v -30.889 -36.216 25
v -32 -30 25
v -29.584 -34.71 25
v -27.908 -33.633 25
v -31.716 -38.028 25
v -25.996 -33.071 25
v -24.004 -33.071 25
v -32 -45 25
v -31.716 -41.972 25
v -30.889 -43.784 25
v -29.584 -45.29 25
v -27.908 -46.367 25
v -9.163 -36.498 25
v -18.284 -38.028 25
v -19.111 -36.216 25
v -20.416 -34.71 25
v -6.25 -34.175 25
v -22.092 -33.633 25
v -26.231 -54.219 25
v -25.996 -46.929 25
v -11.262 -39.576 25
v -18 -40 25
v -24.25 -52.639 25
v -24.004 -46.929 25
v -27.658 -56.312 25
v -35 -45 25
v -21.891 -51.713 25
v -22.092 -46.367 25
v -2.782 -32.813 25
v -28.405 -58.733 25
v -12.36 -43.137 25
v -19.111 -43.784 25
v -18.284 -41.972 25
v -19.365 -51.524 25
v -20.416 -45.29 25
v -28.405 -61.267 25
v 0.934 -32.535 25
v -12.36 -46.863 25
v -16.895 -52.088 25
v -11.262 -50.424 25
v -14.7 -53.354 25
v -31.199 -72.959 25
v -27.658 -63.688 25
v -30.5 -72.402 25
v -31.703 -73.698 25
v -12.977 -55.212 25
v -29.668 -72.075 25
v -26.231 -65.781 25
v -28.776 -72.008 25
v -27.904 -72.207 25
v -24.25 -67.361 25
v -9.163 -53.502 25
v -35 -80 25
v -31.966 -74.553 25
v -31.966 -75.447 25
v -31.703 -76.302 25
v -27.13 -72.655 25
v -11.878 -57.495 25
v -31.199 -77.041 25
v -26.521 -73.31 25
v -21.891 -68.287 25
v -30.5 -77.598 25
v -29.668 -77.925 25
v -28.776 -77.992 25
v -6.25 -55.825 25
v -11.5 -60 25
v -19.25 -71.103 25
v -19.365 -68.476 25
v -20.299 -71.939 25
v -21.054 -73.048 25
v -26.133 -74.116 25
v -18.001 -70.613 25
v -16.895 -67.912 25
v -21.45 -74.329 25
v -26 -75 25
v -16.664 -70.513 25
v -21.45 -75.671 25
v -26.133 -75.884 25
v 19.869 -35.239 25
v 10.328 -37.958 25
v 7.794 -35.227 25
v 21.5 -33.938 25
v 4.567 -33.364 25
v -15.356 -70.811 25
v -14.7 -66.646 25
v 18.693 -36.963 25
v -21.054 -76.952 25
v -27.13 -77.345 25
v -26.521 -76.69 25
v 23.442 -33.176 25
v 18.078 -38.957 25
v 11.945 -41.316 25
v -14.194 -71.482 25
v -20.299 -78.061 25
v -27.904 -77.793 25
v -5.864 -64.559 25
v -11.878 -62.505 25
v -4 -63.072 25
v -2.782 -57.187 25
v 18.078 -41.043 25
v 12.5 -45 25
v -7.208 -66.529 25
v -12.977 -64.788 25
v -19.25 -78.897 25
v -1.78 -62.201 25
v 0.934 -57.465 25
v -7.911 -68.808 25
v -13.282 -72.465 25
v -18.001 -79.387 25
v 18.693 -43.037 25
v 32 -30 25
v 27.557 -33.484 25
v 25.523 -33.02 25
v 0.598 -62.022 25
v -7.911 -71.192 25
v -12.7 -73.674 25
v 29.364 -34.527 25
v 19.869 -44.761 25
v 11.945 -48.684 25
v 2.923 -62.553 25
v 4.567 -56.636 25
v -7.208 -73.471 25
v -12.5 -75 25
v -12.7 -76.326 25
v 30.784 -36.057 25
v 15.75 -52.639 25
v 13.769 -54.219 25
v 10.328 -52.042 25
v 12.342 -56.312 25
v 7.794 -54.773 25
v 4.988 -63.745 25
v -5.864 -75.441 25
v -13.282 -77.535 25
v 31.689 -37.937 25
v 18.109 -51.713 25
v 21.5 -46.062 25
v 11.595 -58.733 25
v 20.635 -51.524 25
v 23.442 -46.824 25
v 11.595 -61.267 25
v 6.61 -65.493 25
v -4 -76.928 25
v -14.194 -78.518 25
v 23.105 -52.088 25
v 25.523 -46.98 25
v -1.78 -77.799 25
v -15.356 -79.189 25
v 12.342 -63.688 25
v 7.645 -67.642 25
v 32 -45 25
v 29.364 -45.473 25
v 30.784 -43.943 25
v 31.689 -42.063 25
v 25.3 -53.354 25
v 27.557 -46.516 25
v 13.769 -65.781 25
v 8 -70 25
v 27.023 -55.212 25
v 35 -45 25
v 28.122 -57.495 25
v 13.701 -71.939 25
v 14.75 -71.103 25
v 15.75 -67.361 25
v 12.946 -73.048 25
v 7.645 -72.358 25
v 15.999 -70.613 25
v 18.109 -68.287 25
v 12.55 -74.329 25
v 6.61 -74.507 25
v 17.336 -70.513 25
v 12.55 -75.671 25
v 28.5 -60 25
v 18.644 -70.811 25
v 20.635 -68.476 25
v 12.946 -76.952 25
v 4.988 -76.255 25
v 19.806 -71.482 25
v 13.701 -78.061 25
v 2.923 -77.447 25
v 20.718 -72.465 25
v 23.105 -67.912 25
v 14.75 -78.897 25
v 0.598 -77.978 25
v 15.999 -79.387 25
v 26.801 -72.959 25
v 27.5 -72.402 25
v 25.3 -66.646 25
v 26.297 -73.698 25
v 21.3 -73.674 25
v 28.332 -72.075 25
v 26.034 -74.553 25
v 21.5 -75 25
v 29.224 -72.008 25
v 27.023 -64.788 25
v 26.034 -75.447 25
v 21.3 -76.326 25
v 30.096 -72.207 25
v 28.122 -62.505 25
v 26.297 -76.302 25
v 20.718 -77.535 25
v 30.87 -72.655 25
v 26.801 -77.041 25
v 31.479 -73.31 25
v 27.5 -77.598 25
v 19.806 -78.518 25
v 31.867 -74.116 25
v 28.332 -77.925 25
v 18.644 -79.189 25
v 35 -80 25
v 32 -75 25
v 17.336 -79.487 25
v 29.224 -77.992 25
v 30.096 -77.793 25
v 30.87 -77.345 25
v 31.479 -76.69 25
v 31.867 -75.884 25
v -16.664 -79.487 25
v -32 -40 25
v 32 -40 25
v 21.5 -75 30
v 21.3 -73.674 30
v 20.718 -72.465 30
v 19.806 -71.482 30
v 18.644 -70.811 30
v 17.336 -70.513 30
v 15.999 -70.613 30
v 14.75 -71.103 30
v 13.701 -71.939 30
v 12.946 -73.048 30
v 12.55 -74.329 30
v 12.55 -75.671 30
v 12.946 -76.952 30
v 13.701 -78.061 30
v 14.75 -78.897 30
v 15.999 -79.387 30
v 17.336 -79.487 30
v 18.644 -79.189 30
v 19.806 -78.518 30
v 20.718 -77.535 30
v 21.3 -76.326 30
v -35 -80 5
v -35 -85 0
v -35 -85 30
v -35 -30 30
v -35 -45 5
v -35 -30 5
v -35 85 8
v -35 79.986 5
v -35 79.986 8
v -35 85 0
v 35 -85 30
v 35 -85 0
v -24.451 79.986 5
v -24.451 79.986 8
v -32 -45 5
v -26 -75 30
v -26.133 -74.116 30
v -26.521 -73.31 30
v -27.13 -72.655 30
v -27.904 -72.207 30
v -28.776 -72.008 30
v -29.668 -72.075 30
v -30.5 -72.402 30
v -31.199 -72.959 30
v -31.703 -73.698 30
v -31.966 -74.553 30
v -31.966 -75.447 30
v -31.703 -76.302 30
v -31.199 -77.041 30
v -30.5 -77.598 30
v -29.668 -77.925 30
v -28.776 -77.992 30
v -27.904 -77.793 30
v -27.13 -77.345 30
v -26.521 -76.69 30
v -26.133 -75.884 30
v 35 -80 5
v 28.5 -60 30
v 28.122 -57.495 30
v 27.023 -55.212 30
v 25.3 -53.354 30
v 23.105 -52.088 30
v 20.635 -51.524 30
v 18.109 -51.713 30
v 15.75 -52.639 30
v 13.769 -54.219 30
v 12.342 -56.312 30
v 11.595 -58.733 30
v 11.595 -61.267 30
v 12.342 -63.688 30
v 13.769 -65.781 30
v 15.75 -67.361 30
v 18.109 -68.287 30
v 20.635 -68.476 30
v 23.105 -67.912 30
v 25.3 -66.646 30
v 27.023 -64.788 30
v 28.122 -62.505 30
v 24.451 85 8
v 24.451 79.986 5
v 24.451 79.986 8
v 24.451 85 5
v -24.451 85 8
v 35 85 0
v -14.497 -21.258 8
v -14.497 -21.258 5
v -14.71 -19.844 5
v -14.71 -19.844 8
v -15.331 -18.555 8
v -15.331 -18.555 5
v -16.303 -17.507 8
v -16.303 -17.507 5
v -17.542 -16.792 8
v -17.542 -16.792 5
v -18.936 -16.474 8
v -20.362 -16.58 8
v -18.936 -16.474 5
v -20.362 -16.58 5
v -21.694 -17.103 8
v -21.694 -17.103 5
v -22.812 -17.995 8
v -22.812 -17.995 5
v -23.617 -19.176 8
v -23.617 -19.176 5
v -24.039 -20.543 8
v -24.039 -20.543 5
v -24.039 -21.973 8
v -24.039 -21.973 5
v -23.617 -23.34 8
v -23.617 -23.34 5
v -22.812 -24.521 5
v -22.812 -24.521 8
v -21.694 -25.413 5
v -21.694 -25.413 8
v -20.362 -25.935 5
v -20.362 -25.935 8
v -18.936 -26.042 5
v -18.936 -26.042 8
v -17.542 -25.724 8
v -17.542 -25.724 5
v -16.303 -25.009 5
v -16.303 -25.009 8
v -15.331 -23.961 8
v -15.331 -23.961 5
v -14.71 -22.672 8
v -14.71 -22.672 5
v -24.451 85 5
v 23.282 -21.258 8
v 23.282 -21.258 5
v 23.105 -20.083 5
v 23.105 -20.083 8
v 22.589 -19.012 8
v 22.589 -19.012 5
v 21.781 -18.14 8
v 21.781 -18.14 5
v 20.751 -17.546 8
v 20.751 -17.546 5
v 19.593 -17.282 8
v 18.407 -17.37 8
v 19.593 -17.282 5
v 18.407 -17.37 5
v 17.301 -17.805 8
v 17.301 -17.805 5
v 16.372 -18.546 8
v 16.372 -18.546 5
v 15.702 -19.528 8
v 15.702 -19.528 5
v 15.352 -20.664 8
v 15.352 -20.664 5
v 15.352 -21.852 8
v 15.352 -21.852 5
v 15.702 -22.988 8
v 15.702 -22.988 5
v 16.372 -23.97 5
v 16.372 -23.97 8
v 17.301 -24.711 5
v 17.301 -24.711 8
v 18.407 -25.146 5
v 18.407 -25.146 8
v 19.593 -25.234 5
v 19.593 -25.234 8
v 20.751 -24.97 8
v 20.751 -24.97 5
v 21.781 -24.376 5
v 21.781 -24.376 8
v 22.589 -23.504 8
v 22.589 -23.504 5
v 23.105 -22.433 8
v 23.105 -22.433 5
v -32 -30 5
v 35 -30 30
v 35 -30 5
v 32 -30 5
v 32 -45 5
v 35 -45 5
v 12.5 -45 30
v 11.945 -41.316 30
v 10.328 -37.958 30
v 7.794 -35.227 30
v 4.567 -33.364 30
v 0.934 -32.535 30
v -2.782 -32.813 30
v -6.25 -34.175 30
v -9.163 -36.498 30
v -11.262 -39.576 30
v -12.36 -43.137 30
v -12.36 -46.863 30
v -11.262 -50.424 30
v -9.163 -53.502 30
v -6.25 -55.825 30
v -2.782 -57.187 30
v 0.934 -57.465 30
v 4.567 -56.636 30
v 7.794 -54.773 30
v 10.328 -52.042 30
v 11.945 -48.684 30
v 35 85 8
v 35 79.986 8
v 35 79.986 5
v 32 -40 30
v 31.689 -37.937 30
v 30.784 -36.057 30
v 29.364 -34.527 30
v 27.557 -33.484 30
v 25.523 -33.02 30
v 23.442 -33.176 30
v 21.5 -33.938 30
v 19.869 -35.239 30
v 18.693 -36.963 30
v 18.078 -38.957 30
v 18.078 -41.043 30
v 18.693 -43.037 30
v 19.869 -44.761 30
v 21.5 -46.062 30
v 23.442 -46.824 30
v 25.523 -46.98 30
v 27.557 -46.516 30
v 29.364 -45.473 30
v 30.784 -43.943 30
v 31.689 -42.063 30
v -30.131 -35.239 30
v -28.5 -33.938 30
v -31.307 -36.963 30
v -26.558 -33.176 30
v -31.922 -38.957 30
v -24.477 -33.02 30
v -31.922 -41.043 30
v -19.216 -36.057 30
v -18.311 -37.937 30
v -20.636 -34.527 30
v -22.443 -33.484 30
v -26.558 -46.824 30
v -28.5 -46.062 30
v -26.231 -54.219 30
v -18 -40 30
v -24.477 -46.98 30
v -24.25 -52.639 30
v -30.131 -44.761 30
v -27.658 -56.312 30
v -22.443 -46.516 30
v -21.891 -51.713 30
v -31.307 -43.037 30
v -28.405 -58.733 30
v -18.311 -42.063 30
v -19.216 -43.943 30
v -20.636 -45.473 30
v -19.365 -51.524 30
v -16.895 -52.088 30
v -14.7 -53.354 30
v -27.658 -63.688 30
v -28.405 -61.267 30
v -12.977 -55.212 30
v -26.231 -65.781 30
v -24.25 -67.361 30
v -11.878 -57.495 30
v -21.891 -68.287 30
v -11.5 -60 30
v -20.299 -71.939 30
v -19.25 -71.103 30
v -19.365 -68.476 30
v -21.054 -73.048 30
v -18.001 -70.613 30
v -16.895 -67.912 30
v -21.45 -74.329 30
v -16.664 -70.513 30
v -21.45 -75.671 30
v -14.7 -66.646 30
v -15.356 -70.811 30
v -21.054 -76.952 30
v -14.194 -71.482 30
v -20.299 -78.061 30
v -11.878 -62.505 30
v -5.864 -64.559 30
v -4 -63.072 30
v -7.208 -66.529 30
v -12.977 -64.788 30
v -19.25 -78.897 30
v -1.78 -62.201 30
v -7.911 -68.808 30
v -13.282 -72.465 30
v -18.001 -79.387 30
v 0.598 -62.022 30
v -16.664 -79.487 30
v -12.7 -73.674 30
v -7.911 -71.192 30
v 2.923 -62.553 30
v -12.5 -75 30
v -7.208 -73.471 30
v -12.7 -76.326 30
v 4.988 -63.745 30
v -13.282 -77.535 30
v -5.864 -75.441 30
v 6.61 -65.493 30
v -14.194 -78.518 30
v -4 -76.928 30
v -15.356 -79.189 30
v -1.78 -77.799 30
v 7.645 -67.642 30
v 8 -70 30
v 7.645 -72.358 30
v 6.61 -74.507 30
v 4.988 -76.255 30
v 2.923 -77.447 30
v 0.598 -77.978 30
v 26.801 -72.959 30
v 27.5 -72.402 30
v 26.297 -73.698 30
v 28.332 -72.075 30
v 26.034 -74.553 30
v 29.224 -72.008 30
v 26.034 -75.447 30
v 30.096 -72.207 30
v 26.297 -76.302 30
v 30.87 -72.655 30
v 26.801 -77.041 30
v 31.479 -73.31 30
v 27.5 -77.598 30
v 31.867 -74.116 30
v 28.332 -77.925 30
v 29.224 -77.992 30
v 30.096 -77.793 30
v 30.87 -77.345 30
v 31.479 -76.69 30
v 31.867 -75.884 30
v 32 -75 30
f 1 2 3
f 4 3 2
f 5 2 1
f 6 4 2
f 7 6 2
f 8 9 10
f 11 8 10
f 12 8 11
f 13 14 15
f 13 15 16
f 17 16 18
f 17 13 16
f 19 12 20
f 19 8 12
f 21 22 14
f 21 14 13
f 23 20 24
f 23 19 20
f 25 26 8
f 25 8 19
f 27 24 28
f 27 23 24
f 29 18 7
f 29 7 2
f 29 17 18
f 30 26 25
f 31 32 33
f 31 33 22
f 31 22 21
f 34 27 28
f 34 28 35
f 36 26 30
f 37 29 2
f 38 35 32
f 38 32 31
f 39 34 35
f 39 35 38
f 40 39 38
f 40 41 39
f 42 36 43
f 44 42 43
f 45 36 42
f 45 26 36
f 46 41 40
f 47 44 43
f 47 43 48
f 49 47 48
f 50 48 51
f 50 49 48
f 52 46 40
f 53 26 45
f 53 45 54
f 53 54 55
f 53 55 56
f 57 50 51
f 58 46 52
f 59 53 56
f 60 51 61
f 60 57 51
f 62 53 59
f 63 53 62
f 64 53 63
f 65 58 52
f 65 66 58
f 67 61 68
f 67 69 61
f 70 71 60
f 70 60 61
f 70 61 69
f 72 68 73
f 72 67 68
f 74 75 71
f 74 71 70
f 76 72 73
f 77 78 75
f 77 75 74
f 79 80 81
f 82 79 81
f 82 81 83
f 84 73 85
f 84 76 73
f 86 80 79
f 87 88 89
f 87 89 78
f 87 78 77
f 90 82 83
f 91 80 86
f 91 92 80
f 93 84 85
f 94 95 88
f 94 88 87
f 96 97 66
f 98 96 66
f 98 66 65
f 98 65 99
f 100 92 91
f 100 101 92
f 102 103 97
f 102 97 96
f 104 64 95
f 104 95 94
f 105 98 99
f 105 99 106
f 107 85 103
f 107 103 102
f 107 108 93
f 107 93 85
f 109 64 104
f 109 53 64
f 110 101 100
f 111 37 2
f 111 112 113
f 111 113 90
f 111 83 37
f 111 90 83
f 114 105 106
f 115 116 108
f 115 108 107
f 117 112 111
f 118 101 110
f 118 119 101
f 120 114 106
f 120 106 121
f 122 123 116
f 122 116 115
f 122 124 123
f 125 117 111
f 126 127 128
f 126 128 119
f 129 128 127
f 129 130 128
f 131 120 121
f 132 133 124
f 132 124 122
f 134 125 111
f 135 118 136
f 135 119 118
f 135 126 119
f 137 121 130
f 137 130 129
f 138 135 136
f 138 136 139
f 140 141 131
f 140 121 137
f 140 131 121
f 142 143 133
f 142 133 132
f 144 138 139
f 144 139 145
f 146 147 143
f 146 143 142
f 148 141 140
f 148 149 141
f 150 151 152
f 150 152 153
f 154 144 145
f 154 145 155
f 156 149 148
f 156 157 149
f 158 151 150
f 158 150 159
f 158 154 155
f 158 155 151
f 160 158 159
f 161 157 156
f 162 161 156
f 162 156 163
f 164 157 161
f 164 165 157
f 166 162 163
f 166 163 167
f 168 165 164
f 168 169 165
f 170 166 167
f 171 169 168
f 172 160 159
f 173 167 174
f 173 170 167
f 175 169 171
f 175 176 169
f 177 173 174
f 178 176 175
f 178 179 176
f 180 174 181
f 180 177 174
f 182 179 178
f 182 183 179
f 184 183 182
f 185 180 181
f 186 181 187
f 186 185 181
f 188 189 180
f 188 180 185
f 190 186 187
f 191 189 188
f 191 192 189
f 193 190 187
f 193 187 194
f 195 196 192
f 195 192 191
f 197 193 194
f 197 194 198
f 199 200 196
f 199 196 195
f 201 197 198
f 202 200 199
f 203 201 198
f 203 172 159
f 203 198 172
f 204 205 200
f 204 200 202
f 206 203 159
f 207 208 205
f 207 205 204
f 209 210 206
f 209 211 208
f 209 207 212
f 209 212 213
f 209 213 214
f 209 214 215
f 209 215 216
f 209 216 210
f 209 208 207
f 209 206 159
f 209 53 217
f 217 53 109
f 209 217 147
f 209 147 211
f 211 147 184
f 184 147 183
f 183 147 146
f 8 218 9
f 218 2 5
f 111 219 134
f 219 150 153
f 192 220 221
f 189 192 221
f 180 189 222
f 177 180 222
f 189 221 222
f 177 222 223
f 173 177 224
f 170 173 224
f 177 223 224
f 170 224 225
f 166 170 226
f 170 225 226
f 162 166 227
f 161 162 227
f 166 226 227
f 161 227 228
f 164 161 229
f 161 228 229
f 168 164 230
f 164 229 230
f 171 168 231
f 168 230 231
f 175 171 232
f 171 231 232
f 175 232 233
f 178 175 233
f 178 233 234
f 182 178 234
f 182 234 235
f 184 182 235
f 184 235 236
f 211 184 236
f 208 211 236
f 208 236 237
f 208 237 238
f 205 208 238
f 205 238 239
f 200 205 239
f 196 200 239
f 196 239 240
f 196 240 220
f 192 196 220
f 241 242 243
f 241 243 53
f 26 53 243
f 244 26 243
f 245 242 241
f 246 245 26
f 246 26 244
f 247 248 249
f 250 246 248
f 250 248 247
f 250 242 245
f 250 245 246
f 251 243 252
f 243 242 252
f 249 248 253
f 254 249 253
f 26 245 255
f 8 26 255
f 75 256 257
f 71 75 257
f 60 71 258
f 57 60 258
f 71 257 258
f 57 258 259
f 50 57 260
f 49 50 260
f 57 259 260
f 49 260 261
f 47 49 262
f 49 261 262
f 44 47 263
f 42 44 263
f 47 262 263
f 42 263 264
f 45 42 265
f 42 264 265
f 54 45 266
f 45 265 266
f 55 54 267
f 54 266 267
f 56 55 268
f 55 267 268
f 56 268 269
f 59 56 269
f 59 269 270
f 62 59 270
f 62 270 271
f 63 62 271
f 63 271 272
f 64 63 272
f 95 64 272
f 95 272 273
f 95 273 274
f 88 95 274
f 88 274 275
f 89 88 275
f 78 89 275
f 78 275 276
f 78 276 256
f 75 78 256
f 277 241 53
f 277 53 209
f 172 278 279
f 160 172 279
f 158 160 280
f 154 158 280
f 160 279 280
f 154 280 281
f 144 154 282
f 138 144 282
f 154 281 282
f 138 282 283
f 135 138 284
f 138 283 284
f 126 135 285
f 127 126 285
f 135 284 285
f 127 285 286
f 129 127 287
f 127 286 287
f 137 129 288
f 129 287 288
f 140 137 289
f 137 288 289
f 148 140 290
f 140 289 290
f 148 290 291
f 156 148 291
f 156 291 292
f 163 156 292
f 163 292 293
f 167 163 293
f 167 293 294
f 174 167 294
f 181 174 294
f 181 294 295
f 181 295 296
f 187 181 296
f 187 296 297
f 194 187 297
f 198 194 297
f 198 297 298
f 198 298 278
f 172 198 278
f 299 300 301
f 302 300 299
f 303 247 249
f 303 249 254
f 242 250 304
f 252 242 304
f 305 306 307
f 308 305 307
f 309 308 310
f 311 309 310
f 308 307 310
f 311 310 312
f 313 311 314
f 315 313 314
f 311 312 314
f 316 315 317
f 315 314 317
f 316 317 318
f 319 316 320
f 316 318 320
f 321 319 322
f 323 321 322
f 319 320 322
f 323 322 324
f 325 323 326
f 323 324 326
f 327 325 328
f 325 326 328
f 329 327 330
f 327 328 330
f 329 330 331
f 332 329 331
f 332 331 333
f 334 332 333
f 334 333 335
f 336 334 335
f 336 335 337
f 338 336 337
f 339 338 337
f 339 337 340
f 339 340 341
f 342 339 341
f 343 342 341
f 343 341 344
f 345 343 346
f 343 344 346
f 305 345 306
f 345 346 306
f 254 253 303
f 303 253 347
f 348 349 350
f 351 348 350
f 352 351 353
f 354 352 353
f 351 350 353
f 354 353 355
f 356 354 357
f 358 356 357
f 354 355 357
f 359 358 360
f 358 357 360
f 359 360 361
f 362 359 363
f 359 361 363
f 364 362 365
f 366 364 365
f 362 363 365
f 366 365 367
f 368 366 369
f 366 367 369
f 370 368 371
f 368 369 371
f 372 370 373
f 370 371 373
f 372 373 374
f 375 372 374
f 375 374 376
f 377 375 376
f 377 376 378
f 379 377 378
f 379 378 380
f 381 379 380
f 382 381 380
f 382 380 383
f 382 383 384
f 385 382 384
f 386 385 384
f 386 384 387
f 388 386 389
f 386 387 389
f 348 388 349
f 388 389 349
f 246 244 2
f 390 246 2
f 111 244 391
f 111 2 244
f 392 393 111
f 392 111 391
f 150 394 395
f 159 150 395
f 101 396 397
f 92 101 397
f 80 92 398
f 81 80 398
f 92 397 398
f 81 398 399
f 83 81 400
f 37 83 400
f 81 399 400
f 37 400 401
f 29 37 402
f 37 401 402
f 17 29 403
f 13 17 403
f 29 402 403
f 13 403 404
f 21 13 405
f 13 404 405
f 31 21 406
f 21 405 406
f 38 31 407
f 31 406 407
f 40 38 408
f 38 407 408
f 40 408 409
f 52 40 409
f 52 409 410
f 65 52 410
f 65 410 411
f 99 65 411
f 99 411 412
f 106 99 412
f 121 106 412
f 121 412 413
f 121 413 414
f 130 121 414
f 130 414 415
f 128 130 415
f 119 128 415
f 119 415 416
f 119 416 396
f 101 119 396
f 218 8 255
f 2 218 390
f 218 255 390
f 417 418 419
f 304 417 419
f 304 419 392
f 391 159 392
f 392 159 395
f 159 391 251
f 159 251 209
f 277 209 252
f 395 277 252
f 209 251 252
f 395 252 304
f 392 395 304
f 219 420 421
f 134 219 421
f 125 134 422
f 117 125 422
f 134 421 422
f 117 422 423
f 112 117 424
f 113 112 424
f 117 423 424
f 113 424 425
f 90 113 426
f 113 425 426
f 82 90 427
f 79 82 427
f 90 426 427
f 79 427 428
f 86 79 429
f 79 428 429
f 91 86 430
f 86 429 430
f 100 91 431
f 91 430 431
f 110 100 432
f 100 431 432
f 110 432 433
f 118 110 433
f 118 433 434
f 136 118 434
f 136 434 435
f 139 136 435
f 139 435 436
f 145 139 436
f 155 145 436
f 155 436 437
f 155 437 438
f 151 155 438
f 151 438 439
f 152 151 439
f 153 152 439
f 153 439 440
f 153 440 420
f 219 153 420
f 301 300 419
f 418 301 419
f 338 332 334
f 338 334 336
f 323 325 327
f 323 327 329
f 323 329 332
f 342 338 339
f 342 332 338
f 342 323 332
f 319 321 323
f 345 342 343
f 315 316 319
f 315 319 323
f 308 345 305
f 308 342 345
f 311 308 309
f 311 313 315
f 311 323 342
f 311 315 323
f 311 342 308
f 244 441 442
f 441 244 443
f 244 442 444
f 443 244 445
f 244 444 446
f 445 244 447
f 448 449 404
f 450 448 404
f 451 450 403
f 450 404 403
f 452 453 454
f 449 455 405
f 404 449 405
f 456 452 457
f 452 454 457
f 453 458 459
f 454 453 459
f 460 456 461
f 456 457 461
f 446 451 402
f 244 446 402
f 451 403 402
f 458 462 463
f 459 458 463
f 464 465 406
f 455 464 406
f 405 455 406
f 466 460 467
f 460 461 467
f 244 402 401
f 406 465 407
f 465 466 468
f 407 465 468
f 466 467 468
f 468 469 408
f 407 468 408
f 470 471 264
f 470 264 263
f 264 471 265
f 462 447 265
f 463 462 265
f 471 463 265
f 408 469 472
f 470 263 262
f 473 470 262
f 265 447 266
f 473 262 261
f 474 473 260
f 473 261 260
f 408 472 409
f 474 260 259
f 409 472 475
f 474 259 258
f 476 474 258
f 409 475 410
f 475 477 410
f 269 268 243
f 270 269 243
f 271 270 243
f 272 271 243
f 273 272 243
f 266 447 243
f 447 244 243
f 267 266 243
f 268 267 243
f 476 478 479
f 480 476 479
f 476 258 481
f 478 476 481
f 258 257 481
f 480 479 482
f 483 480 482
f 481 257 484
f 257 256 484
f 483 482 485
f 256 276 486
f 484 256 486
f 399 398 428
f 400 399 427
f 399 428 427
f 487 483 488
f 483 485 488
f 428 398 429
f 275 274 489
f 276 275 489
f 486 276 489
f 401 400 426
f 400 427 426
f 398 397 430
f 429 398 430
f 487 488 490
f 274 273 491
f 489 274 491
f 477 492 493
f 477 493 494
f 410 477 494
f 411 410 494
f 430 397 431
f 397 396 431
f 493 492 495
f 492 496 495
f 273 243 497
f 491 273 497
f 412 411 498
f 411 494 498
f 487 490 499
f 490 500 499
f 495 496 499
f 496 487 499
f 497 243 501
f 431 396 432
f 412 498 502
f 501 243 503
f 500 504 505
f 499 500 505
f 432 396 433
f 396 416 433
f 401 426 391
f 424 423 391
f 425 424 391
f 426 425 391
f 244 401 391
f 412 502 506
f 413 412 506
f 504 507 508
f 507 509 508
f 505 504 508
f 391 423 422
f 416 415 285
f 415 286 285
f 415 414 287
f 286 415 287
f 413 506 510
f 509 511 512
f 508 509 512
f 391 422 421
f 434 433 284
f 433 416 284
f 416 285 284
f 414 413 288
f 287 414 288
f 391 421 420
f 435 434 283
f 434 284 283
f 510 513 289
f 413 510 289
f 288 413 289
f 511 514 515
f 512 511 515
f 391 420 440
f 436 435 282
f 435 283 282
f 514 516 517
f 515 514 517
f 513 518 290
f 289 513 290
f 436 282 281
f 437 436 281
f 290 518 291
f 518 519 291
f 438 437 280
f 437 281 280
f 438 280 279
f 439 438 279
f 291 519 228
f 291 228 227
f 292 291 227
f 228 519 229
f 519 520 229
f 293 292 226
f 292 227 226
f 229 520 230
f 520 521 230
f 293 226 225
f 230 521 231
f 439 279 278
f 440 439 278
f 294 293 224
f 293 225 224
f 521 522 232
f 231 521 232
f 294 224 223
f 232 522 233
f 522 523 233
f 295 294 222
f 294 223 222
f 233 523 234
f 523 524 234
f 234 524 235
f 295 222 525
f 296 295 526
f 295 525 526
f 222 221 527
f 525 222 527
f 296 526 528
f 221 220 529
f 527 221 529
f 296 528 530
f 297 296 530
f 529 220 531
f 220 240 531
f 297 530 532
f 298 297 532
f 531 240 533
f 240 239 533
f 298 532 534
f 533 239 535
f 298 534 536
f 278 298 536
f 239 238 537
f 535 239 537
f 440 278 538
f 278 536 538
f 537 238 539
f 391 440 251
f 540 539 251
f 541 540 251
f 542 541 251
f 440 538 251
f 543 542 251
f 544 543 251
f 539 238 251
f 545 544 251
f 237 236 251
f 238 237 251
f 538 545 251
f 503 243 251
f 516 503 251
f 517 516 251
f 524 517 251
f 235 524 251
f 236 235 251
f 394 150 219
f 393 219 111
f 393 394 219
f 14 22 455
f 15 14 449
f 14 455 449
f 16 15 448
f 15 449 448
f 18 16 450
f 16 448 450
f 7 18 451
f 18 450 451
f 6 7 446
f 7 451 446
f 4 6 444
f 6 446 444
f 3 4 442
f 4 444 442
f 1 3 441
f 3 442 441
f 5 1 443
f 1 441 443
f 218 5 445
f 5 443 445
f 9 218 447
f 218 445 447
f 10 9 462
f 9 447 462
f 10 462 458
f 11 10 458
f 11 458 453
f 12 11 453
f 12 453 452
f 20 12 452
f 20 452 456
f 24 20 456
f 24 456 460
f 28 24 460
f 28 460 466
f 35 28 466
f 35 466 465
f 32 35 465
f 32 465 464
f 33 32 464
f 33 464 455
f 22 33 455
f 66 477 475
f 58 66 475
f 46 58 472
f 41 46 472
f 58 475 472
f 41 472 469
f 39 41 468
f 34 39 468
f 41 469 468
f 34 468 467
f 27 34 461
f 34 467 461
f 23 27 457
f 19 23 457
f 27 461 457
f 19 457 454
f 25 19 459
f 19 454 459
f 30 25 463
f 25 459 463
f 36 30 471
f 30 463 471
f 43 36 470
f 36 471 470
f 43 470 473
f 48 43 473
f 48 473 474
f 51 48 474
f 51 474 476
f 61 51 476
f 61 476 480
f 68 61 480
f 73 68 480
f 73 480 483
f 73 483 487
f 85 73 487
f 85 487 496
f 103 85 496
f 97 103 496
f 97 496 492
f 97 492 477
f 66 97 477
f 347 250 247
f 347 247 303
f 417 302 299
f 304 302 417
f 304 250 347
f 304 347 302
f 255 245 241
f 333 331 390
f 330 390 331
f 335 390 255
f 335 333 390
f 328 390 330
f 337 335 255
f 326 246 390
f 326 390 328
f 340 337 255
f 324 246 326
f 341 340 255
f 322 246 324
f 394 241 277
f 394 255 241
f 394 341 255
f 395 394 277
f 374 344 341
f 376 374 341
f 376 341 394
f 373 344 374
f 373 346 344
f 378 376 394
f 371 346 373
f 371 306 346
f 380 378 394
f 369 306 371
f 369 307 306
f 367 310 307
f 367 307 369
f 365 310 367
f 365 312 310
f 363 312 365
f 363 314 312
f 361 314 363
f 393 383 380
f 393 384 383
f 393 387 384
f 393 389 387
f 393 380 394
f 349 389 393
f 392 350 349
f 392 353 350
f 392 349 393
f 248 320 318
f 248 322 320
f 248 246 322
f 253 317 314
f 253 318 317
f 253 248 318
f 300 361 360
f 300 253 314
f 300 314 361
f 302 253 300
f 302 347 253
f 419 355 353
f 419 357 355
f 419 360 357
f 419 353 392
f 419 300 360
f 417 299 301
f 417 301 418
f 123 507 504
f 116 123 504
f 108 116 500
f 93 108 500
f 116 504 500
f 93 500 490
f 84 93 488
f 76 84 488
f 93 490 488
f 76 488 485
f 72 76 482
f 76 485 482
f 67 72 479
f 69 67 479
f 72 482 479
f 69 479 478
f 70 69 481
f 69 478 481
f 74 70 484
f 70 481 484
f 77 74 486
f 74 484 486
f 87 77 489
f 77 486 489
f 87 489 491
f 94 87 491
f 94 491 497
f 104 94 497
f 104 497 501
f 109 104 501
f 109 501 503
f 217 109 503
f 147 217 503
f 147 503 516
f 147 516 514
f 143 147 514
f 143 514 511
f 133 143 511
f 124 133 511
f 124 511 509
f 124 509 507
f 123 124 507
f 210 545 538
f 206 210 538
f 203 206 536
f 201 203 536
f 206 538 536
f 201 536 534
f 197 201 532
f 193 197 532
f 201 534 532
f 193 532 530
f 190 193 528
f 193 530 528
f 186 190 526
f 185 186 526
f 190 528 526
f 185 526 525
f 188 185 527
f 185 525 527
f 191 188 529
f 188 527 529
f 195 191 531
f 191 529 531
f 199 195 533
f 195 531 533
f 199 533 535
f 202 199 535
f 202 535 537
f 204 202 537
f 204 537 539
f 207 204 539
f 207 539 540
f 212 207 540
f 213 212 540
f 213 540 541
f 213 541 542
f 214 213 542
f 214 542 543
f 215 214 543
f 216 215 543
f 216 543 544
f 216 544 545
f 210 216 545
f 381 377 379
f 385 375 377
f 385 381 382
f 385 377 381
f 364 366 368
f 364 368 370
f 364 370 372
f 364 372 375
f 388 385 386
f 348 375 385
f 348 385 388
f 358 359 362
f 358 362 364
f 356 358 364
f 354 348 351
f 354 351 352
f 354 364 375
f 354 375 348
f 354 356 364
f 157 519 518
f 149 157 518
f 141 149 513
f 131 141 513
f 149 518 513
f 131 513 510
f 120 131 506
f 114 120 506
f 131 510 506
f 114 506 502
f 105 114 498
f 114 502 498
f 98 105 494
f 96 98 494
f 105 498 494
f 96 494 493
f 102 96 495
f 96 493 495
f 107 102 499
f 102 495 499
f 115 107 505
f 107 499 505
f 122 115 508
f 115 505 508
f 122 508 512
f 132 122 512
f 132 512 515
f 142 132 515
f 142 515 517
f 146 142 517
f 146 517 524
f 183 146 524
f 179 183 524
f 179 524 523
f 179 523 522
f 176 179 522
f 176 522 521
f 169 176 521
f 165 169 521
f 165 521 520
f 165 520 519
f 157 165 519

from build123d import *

# Parameters (mm, degrees)
SKETCH1_W           = 70
SKETCH1_H           = 170
BOSS_EXTRUDE1_DEPTH = 5
SKETCH2_W           = 70
SKETCH2_H           = 5
BOSS_EXTRUDE2_DEPTH = 25
SKETCH3_W           = 70
SKETCH3_H           = 5
BOSS_EXTRUDE3_DEPTH = 50
SKETCH4_W           = 3
SKETCH4_H           = 15
BOSS_EXTRUDE4_DEPTH = 20
CUT_EXTRUDE1_REACH  = 98.695
SKETCH6_R           = 12.5
SKETCH6_R_2         = 7
SKETCH6_R_3         = 8.5
SKETCH6_R_4         = 8
SKETCH6_R_5         = 4.5
SKETCH6_R_6         = 3
SKETCH7_R           = 4.797792648
SKETCH7_R_2         = 3.987535838
SKETCH7_W           = 10.549301712
SKETCH7_H           = 5.014130384
BOSS_EXTRUDE5_DEPTH = 3


with BuildPart() as part:
    # Sketch1 → Boss-Extrude1 (new body)
    with BuildSketch(Plane.XY):
        Rectangle(SKETCH1_W, SKETCH1_H)
    extrude(amount=BOSS_EXTRUDE1_DEPTH)

    # Sketch2 → Boss-Extrude2 (add)
    with BuildSketch(Plane.XY.offset(5)):
        with Locations((0, -82.5)):
            Rectangle(SKETCH2_W, SKETCH2_H)
    extrude(amount=BOSS_EXTRUDE2_DEPTH)

    # Sketch3 → Boss-Extrude3 (add)
    with BuildSketch(Plane(origin=(0, -80, 0), x_dir=(1, 0, 0), z_dir=(0, 1, 0))):
        with Locations((0, -27.5)):
            Rectangle(SKETCH3_W, SKETCH3_H)
    extrude(amount=BOSS_EXTRUDE3_DEPTH)

    # Sketch4 → Boss-Extrude4 (add)
    with BuildSketch(Plane.XY.offset(5)):
        with Locations((-33.5, -37.5)):
            Rectangle(SKETCH4_W, SKETCH4_H)
        with Locations((33.5, -37.5)):
            Rectangle(SKETCH4_W, SKETCH4_H)
    extrude(amount=BOSS_EXTRUDE4_DEPTH)

    # Sketch6 → Cut-Extrude1 (cut, up to next)
    with BuildSketch(Plane.XY.offset(30), mode=Mode.PRIVATE) as cut_extrude1_sk1:
        with Locations((0, -45)):
            Circle(SKETCH6_R)
    cut_extrude1_tool1 = extrude(cut_extrude1_sk1.sketch, amount=-CUT_EXTRUDE1_REACH, mode=Mode.PRIVATE) & part.part
    # Sketch6 → Cut-Extrude1 (cut, up to next)
    with BuildSketch(Plane.XY.offset(30), mode=Mode.PRIVATE) as cut_extrude1_sk2:
        with Locations((-25, -40)):
            Circle(SKETCH6_R_2)
    cut_extrude1_tool2 = extrude(cut_extrude1_sk2.sketch, amount=-CUT_EXTRUDE1_REACH, mode=Mode.PRIVATE) & part.part
    # Sketch6 → Cut-Extrude1 (cut, up to next)
    with BuildSketch(Plane.XY.offset(30), mode=Mode.PRIVATE) as cut_extrude1_sk3:
        with Locations((25, -40)):
            Circle(SKETCH6_R_2)
    cut_extrude1_tool3 = extrude(cut_extrude1_sk3.sketch, amount=-CUT_EXTRUDE1_REACH, mode=Mode.PRIVATE) & part.part
    # Sketch6 → Cut-Extrude1 (cut, up to next)
    with BuildSketch(Plane.XY.offset(30), mode=Mode.PRIVATE) as cut_extrude1_sk4:
        with Locations((-20, -60)):
            Circle(SKETCH6_R_3)
    cut_extrude1_tool4 = extrude(cut_extrude1_sk4.sketch, amount=-CUT_EXTRUDE1_REACH, mode=Mode.PRIVATE) & part.part
    # Sketch6 → Cut-Extrude1 (cut, up to next)
    with BuildSketch(Plane.XY.offset(30), mode=Mode.PRIVATE) as cut_extrude1_sk5:
        with Locations((20, -60)):
            Circle(SKETCH6_R_3)
    cut_extrude1_tool5 = extrude(cut_extrude1_sk5.sketch, amount=-CUT_EXTRUDE1_REACH, mode=Mode.PRIVATE) & part.part
    # Sketch6 → Cut-Extrude1 (cut, up to next)
    with BuildSketch(Plane.XY.offset(30), mode=Mode.PRIVATE) as cut_extrude1_sk6:
        with Locations((0, -70)):
            Circle(SKETCH6_R_4)
    cut_extrude1_tool6 = extrude(cut_extrude1_sk6.sketch, amount=-CUT_EXTRUDE1_REACH, mode=Mode.PRIVATE) & part.part
    # Sketch6 → Cut-Extrude1 (cut, up to next)
    with BuildSketch(Plane.XY.offset(30), mode=Mode.PRIVATE) as cut_extrude1_sk7:
        with Locations((-17, -75)):
            Circle(SKETCH6_R_5)
    cut_extrude1_tool7 = extrude(cut_extrude1_sk7.sketch, amount=-CUT_EXTRUDE1_REACH, mode=Mode.PRIVATE) & part.part
    # Sketch6 → Cut-Extrude1 (cut, up to next)
    with BuildSketch(Plane.XY.offset(30), mode=Mode.PRIVATE) as cut_extrude1_sk8:
        with Locations((17, -75)):
            Circle(SKETCH6_R_5)
    cut_extrude1_tool8 = extrude(cut_extrude1_sk8.sketch, amount=-CUT_EXTRUDE1_REACH, mode=Mode.PRIVATE) & part.part
    # Sketch6 → Cut-Extrude1 (cut, up to next)
    with BuildSketch(Plane.XY.offset(30), mode=Mode.PRIVATE) as cut_extrude1_sk9:
        with Locations((29, -75)):
            Circle(SKETCH6_R_6)
    cut_extrude1_tool9 = extrude(cut_extrude1_sk9.sketch, amount=-CUT_EXTRUDE1_REACH, mode=Mode.PRIVATE) & part.part
    # Sketch6 → Cut-Extrude1 (cut, up to next)
    with BuildSketch(Plane.XY.offset(30), mode=Mode.PRIVATE) as cut_extrude1_sk10:
        with Locations((-29, -75)):
            Circle(SKETCH6_R_6)
    cut_extrude1_tool10 = extrude(cut_extrude1_sk10.sketch, amount=-CUT_EXTRUDE1_REACH, mode=Mode.PRIVATE) & part.part
    add(cut_extrude1_tool1.solids().sort_by_distance((0, -45, 30))[0], mode=Mode.SUBTRACT)
    add(cut_extrude1_tool2.solids().sort_by_distance((-25, -40, 30))[0], mode=Mode.SUBTRACT)
    add(cut_extrude1_tool3.solids().sort_by_distance((25, -40, 30))[0], mode=Mode.SUBTRACT)
    add(cut_extrude1_tool4.solids().sort_by_distance((-20, -60, 30))[0], mode=Mode.SUBTRACT)
    add(cut_extrude1_tool5.solids().sort_by_distance((20, -60, 30))[0], mode=Mode.SUBTRACT)
    add(cut_extrude1_tool6.solids().sort_by_distance((0, -70, 30))[0], mode=Mode.SUBTRACT)
    add(cut_extrude1_tool7.solids().sort_by_distance((-17, -75, 30))[0], mode=Mode.SUBTRACT)
    add(cut_extrude1_tool8.solids().sort_by_distance((17, -75, 30))[0], mode=Mode.SUBTRACT)
    add(cut_extrude1_tool9.solids().sort_by_distance((29, -75, 30))[0], mode=Mode.SUBTRACT)
    add(cut_extrude1_tool10.solids().sort_by_distance((-29, -75, 30))[0], mode=Mode.SUBTRACT)

    # Sketch7 → Boss-Extrude5 (add)
    with BuildSketch(Plane.XY.offset(5)):
        with Locations((-19.294668455, -21.257959738)):
            Circle(SKETCH7_R)
        with Locations((19.294668455, -21.257959738)):
            Circle(SKETCH7_R_2)
        with Locations((-29.725349144, 82.492934808)):
            Rectangle(SKETCH7_W, SKETCH7_H)
        with Locations((29.725349144, 82.492934808)):
            Rectangle(SKETCH7_W, SKETCH7_H)
    extrude(amount=BOSS_EXTRUDE5_DEPTH)


solid = part.part
